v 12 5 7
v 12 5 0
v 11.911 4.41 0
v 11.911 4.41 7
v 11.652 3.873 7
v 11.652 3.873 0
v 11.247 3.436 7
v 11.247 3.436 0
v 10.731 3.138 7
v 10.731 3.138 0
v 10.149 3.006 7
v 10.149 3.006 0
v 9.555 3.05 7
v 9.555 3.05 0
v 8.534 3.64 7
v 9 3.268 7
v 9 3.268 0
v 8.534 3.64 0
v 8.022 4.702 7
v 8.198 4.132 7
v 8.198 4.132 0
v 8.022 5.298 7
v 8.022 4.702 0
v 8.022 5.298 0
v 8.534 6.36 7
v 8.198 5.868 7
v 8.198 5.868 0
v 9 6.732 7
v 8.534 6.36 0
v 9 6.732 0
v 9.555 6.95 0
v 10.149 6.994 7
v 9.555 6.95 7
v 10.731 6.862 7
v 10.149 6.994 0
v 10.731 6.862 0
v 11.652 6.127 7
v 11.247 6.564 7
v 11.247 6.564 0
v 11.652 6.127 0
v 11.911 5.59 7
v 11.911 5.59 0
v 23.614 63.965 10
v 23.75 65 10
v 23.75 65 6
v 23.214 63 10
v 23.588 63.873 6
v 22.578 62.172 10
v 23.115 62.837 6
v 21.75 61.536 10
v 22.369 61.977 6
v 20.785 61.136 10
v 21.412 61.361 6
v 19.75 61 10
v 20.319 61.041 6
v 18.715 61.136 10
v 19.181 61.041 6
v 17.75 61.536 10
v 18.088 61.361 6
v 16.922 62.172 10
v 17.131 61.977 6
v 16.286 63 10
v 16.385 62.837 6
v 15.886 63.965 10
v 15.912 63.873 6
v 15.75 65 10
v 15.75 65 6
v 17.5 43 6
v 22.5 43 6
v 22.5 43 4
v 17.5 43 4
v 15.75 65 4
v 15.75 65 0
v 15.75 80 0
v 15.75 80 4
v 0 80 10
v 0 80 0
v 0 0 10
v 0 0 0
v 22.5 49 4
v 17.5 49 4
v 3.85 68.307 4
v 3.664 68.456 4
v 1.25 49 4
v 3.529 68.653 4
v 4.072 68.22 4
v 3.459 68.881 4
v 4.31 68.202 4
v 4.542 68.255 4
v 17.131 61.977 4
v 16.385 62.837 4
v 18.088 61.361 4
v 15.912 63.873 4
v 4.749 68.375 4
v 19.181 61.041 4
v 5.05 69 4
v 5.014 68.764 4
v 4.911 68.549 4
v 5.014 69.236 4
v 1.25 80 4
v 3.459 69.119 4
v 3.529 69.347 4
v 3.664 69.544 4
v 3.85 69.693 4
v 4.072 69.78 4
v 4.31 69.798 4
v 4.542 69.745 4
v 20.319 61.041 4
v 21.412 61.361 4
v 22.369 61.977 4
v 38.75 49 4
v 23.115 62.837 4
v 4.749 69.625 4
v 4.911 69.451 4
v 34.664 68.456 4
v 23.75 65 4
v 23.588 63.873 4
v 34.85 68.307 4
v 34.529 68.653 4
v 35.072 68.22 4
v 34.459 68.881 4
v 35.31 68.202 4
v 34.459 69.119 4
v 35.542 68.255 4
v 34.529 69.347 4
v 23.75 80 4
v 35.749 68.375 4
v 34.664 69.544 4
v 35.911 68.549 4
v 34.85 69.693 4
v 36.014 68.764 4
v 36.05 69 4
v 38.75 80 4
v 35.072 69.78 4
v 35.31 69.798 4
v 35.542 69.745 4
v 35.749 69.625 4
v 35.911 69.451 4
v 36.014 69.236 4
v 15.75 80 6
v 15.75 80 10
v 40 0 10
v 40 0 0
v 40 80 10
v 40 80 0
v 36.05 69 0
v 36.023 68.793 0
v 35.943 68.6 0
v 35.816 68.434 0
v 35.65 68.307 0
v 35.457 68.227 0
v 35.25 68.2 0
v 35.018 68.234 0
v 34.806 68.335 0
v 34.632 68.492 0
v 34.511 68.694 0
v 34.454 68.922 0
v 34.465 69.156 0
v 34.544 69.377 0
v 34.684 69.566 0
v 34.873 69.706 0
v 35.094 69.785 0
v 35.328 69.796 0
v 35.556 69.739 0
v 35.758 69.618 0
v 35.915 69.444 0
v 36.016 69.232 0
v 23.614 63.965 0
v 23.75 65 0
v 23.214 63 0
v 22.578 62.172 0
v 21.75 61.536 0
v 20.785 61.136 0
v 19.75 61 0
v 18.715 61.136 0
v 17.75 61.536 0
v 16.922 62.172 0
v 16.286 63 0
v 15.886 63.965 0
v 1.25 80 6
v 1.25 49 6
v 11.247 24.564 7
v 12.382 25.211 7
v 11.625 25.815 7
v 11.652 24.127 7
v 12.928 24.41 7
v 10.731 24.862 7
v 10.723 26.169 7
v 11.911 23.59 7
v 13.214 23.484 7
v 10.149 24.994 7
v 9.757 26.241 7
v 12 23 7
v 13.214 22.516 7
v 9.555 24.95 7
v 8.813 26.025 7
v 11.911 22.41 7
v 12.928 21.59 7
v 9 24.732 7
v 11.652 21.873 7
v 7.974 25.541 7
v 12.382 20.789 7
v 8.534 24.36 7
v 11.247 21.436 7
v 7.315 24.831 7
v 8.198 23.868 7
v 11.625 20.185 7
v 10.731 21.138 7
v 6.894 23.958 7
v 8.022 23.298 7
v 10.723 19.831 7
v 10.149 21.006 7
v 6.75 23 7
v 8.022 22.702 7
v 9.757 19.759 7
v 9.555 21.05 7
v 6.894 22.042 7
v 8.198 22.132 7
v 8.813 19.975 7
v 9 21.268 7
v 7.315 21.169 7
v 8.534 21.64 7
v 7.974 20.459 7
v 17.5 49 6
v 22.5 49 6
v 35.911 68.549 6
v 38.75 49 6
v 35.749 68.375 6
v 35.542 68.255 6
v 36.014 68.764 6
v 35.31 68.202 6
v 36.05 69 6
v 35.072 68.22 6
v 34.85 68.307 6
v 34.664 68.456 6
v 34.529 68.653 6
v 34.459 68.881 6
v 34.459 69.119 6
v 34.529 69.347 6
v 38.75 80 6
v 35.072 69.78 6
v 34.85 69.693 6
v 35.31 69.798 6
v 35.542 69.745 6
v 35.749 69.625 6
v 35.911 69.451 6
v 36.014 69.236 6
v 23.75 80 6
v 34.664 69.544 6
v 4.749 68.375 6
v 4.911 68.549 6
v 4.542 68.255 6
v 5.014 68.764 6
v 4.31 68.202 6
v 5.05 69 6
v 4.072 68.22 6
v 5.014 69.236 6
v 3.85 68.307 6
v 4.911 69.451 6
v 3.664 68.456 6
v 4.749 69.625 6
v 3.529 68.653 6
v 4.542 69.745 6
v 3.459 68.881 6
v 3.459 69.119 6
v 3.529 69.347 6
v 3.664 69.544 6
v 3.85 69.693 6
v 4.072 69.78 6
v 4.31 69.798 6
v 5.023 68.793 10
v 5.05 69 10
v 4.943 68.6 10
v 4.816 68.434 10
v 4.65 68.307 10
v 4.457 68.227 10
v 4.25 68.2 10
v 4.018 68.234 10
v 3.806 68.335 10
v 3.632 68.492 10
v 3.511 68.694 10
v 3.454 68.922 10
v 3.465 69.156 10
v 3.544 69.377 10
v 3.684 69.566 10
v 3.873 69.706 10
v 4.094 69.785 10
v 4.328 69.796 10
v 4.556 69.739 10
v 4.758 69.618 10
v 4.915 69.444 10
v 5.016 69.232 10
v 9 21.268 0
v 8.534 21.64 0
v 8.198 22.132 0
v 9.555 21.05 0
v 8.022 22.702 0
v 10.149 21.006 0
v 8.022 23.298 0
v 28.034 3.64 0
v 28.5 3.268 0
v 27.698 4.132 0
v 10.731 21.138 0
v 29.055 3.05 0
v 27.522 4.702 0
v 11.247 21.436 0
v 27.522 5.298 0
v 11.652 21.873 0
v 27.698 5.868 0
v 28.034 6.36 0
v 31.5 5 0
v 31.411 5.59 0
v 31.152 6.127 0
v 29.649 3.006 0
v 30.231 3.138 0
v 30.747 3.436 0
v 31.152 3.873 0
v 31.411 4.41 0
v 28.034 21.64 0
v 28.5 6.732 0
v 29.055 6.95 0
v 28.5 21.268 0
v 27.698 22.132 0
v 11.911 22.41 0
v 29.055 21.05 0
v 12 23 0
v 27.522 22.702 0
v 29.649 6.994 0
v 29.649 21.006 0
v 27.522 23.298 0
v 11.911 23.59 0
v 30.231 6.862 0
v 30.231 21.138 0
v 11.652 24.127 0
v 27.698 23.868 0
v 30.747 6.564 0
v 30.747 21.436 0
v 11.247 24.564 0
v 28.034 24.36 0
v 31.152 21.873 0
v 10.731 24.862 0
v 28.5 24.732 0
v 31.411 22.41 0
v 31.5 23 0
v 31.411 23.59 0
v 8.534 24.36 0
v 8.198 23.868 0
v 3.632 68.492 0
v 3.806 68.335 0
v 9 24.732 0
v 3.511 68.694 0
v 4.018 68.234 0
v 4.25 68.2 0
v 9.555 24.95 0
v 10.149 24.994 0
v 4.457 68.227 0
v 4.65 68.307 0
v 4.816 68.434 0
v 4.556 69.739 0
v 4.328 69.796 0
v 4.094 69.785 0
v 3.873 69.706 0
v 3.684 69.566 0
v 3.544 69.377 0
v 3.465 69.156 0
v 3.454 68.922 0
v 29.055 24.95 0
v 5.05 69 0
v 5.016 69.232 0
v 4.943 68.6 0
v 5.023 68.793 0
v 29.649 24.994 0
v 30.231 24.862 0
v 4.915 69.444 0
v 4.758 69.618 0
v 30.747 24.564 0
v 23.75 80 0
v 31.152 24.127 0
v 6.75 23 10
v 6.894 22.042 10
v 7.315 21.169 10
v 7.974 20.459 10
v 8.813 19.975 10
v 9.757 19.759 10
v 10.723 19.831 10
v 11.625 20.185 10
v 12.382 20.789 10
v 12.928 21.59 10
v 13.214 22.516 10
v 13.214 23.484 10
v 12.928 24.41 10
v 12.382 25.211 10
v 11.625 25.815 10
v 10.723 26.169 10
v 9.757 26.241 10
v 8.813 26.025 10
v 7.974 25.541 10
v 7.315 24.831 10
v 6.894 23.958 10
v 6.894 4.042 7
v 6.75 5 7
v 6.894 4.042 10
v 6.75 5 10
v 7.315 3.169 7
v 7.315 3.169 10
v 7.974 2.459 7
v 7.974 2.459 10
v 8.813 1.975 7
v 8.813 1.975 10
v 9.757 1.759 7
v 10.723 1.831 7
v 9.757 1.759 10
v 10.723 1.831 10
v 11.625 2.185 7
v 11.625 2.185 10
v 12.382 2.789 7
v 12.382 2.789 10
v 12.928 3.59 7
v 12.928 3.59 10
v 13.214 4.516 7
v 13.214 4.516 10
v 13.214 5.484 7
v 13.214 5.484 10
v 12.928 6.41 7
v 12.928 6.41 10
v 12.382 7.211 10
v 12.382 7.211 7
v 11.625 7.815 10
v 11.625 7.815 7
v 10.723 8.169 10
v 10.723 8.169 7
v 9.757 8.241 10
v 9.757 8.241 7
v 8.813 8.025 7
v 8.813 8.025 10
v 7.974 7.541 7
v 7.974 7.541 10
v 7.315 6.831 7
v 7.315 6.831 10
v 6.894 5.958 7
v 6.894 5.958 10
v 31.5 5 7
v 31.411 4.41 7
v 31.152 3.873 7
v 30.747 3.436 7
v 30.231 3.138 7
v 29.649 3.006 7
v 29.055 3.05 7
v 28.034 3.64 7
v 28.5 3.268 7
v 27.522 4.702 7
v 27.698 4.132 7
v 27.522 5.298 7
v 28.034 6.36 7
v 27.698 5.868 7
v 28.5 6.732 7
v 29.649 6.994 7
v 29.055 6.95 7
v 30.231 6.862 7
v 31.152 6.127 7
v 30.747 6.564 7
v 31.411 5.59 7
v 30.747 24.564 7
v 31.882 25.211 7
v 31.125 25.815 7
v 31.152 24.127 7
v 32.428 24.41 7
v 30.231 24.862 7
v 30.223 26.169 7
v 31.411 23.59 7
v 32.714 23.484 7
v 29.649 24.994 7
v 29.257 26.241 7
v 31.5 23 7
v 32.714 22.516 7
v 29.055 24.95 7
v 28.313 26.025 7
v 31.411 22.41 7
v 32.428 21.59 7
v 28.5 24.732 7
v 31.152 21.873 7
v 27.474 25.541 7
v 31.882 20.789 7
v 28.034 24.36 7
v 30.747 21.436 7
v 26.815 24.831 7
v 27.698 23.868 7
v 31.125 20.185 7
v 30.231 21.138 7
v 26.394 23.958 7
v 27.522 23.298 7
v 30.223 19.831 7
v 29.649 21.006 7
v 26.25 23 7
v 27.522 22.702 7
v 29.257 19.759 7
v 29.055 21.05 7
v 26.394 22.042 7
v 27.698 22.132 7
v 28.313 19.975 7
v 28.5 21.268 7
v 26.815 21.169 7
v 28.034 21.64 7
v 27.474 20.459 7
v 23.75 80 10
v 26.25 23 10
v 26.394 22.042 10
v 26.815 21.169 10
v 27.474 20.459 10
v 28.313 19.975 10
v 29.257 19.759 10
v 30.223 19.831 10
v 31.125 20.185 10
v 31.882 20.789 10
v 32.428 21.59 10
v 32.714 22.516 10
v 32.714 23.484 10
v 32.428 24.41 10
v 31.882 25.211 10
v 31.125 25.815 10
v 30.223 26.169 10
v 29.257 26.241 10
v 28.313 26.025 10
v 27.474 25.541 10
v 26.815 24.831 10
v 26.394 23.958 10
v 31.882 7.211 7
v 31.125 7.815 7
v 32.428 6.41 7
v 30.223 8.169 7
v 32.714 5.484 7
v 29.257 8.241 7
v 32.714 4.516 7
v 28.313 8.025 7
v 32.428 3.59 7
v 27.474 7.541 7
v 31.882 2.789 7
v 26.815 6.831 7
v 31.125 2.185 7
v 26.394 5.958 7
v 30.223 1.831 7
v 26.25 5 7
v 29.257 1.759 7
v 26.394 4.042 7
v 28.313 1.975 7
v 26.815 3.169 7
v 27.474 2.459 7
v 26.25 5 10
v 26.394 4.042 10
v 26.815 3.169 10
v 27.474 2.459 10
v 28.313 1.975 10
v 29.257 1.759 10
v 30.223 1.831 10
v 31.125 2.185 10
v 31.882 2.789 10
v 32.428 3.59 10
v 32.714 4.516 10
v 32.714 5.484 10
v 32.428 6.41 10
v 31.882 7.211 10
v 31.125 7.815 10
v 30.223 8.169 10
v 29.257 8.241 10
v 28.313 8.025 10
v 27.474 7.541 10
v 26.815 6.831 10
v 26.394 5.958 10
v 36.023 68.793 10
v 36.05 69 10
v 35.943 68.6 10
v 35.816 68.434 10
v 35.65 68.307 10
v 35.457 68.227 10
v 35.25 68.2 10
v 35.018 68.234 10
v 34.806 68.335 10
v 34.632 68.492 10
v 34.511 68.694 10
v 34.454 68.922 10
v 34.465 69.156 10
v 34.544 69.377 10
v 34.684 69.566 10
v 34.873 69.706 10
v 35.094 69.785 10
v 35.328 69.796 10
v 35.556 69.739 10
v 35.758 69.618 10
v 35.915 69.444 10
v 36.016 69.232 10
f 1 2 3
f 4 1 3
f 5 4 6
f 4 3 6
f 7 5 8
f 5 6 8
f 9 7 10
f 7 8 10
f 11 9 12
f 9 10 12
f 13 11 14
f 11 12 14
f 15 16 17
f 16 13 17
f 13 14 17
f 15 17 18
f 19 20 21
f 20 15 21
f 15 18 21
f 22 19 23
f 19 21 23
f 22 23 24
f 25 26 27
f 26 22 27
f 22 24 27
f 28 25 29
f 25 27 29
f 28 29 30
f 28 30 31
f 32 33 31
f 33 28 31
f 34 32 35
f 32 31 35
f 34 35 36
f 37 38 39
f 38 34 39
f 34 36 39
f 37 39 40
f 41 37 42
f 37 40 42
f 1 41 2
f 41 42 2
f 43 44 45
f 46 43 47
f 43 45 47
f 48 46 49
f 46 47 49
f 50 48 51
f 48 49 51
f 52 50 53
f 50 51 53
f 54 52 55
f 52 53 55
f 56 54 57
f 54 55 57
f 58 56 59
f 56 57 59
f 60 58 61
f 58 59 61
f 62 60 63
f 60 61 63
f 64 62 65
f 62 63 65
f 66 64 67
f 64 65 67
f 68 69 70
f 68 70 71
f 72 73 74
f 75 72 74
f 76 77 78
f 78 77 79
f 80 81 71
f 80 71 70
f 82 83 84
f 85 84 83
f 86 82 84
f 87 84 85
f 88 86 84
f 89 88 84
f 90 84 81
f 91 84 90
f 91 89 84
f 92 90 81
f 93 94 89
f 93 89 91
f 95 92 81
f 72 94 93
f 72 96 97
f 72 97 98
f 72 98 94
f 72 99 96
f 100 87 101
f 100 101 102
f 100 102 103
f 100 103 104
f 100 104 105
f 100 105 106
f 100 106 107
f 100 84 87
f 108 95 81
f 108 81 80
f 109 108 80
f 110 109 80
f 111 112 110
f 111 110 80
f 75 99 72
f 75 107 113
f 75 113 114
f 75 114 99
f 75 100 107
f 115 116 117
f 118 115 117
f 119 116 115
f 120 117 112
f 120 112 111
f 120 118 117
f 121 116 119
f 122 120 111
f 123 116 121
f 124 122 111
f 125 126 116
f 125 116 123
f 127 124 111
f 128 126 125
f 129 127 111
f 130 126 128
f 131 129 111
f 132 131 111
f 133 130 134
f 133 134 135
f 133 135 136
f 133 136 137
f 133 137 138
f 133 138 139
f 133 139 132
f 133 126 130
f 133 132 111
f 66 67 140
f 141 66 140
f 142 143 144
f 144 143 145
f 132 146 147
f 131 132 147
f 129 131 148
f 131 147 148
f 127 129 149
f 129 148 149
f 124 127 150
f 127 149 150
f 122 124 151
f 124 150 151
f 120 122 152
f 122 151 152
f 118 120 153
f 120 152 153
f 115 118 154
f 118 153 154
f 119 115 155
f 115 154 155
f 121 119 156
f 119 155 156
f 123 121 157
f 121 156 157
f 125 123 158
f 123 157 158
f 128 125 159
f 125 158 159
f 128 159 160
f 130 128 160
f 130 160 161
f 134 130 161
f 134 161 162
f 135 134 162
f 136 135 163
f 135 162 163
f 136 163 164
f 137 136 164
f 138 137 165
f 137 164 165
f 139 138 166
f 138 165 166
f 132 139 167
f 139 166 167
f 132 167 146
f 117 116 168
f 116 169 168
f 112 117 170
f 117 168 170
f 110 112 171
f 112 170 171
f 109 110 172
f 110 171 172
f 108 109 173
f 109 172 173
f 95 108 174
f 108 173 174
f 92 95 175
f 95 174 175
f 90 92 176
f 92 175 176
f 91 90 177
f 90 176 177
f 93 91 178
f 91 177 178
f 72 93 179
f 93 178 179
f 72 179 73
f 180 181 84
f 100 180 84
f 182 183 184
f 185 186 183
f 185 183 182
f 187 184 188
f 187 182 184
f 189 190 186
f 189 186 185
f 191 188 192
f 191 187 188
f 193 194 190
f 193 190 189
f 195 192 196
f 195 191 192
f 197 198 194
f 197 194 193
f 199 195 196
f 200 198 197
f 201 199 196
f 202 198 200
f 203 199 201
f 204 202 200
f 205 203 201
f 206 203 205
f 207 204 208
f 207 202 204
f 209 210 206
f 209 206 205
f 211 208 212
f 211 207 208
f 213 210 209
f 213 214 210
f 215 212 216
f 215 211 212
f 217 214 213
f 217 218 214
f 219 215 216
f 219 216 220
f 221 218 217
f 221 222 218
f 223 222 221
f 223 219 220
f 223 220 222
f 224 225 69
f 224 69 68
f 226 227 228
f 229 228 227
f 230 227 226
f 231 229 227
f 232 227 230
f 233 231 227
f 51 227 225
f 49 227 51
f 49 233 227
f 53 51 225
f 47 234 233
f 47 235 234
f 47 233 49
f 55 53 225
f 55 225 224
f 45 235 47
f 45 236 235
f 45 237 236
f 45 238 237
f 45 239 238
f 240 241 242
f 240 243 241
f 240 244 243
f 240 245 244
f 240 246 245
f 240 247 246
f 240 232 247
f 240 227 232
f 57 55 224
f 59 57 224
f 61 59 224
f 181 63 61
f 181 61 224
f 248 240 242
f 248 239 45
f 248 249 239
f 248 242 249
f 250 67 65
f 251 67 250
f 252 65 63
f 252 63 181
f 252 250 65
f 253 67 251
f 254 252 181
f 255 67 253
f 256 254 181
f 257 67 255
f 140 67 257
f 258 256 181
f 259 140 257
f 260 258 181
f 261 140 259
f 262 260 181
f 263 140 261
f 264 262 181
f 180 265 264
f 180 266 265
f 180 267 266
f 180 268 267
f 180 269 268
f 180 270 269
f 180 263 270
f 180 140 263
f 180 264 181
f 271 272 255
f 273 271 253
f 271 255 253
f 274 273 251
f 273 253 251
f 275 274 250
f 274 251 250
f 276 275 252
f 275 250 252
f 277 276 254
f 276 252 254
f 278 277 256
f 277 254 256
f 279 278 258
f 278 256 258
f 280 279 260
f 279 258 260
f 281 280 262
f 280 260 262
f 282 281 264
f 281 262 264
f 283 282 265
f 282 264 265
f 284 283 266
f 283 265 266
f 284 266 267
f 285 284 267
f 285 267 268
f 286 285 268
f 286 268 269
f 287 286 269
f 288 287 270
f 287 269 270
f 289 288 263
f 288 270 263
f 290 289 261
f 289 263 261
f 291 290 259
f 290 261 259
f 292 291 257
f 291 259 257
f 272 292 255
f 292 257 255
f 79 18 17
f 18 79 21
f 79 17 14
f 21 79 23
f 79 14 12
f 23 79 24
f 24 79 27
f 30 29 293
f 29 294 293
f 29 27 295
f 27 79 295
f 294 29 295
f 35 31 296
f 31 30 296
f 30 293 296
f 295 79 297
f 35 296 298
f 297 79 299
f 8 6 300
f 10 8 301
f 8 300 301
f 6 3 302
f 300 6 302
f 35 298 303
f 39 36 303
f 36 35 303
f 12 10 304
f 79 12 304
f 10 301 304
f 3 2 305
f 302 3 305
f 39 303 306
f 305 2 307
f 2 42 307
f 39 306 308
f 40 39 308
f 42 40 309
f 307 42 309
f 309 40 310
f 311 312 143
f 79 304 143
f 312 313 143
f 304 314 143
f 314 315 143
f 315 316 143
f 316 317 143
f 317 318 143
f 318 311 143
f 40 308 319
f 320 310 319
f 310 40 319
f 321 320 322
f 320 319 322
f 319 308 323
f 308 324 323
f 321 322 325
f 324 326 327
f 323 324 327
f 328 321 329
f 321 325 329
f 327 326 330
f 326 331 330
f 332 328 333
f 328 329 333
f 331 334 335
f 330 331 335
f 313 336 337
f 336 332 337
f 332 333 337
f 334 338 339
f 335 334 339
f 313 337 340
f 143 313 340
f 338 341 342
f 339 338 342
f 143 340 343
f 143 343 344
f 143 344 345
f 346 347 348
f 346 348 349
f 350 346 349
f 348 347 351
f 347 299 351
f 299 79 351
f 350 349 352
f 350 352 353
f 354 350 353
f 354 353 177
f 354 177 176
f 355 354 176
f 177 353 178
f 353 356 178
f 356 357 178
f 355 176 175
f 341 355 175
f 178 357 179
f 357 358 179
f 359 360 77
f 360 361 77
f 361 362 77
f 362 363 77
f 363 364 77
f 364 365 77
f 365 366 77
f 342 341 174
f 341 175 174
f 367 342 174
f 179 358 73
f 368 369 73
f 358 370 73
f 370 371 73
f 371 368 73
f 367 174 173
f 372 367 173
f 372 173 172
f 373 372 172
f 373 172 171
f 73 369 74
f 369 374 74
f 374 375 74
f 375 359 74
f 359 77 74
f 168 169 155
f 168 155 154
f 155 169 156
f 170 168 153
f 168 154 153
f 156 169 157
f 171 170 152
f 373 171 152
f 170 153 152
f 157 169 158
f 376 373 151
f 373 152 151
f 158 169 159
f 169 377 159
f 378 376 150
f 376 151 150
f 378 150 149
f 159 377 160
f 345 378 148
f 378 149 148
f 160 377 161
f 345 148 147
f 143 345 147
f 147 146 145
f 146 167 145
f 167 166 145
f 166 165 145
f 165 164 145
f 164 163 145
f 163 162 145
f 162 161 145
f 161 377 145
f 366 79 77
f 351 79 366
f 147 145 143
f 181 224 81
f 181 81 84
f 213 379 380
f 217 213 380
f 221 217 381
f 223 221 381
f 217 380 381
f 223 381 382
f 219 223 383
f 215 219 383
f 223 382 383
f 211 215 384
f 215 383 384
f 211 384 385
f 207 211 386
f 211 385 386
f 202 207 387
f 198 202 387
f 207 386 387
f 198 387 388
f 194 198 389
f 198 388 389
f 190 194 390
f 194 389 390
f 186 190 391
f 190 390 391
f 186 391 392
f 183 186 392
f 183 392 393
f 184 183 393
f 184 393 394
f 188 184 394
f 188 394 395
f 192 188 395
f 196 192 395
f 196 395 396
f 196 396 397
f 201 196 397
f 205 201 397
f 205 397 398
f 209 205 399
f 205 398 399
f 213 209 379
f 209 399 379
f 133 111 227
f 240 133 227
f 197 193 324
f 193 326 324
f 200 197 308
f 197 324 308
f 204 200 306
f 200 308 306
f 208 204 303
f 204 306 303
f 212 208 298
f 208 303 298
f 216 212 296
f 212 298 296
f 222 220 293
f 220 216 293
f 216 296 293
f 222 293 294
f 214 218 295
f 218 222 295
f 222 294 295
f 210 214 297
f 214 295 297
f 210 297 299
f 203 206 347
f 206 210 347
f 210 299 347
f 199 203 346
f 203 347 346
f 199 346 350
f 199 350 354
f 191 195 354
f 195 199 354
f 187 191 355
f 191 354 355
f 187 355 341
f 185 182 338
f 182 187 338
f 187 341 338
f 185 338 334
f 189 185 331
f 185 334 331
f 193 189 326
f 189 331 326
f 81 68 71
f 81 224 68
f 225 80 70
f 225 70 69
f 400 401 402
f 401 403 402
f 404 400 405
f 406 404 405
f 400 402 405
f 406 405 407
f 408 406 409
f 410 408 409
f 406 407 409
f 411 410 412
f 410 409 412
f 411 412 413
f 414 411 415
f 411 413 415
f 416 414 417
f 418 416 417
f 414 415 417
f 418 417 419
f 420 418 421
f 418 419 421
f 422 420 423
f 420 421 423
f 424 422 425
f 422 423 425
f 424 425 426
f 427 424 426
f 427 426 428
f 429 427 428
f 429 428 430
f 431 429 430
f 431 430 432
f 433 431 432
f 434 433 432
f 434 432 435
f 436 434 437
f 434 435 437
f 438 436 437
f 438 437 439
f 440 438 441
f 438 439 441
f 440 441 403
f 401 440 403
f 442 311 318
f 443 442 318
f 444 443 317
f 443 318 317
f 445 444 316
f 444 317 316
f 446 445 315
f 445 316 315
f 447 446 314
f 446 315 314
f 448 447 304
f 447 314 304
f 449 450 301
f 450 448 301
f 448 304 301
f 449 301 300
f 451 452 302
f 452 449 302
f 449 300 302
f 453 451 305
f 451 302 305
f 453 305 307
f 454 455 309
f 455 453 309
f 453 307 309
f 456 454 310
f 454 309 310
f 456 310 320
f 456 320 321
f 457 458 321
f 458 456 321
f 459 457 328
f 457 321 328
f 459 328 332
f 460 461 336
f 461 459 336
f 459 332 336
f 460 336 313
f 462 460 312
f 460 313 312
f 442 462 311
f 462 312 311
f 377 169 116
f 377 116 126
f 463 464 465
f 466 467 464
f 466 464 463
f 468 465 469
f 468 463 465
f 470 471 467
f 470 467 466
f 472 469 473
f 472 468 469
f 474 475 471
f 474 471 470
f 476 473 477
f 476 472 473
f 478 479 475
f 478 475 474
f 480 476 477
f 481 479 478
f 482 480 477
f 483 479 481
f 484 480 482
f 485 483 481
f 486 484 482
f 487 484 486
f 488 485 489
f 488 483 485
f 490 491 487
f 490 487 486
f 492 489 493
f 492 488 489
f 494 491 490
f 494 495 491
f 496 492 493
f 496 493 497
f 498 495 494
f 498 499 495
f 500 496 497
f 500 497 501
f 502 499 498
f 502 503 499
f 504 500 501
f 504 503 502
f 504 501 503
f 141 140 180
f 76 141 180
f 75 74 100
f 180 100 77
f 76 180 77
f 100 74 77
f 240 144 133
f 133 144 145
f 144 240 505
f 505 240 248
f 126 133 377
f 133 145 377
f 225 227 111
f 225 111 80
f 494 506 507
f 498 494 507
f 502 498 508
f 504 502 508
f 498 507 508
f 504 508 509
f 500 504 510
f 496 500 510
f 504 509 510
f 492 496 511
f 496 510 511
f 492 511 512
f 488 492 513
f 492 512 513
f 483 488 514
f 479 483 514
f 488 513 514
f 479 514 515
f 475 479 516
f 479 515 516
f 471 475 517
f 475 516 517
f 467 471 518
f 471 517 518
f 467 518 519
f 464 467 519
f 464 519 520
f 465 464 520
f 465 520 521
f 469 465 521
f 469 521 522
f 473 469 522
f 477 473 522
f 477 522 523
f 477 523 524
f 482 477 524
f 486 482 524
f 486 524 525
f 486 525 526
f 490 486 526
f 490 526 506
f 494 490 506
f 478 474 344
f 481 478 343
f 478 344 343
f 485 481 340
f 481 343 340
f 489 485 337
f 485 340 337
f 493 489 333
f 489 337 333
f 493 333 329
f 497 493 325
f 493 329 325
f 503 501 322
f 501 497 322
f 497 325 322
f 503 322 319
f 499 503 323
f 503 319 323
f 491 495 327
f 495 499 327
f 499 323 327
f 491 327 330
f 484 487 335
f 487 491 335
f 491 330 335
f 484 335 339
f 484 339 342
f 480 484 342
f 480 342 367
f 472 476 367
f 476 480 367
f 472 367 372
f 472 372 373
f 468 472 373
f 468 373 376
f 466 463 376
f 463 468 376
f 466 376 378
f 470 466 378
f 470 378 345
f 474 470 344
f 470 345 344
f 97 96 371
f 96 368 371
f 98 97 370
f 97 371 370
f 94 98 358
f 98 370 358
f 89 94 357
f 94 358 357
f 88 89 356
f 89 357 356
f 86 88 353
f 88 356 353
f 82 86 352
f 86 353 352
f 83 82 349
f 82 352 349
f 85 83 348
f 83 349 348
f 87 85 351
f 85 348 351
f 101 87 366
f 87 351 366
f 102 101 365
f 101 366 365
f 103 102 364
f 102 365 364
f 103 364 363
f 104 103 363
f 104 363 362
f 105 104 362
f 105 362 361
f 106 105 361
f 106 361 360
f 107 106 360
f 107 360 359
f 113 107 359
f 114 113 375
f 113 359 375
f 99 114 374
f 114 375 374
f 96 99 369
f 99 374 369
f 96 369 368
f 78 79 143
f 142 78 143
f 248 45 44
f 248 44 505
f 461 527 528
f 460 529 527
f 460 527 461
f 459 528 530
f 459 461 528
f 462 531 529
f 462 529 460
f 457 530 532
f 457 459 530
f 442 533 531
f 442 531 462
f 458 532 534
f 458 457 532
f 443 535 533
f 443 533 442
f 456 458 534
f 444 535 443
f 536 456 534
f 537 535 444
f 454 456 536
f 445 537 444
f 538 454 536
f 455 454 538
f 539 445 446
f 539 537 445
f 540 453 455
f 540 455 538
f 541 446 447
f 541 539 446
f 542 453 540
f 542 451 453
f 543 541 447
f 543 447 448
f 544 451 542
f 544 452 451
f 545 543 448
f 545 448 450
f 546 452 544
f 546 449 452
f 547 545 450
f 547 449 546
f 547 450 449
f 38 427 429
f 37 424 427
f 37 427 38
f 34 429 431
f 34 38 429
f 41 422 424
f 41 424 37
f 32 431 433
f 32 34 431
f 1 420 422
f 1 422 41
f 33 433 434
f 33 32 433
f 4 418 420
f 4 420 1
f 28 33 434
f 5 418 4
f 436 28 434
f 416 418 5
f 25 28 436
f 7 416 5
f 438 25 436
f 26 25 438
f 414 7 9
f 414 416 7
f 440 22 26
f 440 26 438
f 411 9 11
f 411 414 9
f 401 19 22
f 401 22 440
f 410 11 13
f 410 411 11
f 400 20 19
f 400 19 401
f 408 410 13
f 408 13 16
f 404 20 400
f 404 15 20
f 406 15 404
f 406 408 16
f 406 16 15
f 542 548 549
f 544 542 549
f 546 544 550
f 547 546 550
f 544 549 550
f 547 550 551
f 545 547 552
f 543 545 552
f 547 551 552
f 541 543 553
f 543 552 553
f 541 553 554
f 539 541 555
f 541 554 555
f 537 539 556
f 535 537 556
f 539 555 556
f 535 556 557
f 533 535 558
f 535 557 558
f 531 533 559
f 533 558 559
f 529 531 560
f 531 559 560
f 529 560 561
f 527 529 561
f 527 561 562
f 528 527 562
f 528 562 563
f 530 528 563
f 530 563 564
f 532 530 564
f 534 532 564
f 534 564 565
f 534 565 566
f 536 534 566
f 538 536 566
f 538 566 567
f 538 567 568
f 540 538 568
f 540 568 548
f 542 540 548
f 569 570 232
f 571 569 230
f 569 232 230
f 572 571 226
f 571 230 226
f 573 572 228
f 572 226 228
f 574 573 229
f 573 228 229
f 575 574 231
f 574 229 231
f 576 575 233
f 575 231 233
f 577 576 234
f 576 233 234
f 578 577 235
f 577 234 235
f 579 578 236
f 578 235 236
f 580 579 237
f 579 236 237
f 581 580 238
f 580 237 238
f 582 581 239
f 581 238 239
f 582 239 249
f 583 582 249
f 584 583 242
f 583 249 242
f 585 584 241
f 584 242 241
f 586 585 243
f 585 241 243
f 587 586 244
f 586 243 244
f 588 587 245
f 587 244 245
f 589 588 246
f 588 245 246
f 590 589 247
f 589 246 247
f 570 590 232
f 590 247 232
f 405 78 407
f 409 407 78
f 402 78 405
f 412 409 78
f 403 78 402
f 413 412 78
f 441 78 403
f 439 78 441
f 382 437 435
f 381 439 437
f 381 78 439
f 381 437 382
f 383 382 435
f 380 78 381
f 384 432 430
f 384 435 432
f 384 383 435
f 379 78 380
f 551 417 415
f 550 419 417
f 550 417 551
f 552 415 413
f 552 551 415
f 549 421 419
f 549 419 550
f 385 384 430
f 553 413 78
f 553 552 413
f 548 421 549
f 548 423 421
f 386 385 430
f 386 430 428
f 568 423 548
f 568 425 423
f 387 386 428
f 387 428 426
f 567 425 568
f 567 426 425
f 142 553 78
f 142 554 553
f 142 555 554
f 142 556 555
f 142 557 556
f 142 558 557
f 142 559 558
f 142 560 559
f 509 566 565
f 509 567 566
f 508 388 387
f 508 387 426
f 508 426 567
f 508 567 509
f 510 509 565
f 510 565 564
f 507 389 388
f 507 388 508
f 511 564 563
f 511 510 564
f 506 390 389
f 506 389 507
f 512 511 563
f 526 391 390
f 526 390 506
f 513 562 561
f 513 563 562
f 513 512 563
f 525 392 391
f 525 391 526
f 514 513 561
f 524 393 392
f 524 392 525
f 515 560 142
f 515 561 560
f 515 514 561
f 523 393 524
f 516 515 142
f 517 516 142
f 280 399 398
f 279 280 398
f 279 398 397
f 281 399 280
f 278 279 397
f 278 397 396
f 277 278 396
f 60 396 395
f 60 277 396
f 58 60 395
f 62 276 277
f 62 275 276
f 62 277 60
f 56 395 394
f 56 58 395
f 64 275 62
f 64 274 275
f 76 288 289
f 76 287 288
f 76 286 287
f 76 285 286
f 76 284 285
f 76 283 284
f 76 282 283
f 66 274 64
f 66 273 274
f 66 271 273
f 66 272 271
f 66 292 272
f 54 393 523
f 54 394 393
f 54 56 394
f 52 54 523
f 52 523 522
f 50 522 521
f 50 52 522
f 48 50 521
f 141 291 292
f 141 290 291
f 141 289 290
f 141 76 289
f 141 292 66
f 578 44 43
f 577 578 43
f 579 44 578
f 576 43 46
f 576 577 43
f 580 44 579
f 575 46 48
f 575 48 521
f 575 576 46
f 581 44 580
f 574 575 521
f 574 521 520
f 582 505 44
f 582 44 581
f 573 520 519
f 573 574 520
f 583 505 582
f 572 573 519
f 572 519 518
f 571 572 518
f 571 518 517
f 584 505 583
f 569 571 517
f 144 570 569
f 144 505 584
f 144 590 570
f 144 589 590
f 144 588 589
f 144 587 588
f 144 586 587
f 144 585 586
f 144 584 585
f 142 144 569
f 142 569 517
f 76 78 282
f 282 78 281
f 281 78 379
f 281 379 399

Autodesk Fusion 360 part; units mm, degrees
sketch "Sketch1" plane through (0, 0, 0) normal (0, 0, 1) x (1, 0, 0)
  line L0 (0, 0) -> (40, 0)
  line L1 (40, 0) -> (40, 80)
  line L2 (40, 80) -> (0, 80)
  line L3 (0, 80) -> (0, 0)
  line L4 (10, 5) -> (29.5, 5)
  line L5 (29.5, 5) -> (29.5, 23)
  line L6 (29.5, 23) -> (10, 23)
  line L7 (10, 23) -> (10, 5)
  line L8 (19.75, 23) -> (19.75, 65)
  circle A0 centre (19.75, 65) radius 4
  circle A1 centre (10, 23) radius 2
  circle A2 centre (10, 5) radius 2
  circle A3 centre (29.5, 23) radius 2
  circle A4 centre (29.5, 5) radius 2
  line L9 (15.75, 65) -> (15.75, 80)
  line L10 (23.75, 65) -> (23.75, 80)
  line L11 (19.75, 61) -> (35.25, 61)
  line L12 (19.75, 61) -> (4.25, 61)
  line L13 (35.25, 61) -> (35.25, 69)
  circle A5 centre (35.25, 69) radius 0.8
  line L14 (4.25, 61) -> (4.25, 69)
  circle A6 centre (4.25, 69) radius 0.8
  dimension "d1" = 40
  dimension "d2" = 80
  dimension "d3" = 19.5
  dimension "d4" = 18
  dimension "d6" = 42
  dimension "d7" = 8
  dimension "d8" = 4
  dimension "d9" = 4
  dimension "d10" = 4
  dimension "d11" = 4
  dimension "d22" = 15.5
  dimension "d23" = 15.5
  dimension "d24" = 8
  dimension "d25" = 1.6
  dimension "d26" = 8
  dimension "d27" = 1.6
extrude "Extrude1" add sketch "Sketch1" along normal blind 10 contours L4 L5 L6 L7 A1 A2 A3 A4 | L0 L1 L2 L3 A0 L9 L10
sketch "Sketch3" plane through (0, 80, 0) normal (0, 1, 0) x (-1, 0, 0)
  line L0 (-40, 0) -> (-23.75, 0)
  line L1 (-23.75, 0) -> (-23.75, 10)
  line L2 (-23.75, 10) -> (-40, 10)
  line L3 (-40, 10) -> (-40, 0)
  line L4 (-40, 0) -> (-40, 4)
  line L5 (-40, 4) -> (-40, 6)
  line L6 (-40, 6) -> (-40, 10)
  line L7 (-20, 4) -> (-20, 6)
  line L8 (-20, 5) -> (-1.25, 5)
  line L9 (-20, 5) -> (-38.75, 5)
  line L10 (-38.75, 5) -> (-38.75, 6)
  line L11 (-1.25, 5) -> (-1.25, 4)
  line L12 (-38.75, 6) -> (-1.25, 6)
  line L13 (-1.25, 6) -> (-1.25, 4)
  line L14 (-1.25, 4) -> (-38.75, 4)
  line L15 (-38.75, 4) -> (-38.75, 6)
  dimension "d14" = 4
  dimension "d15" = 2
  dimension "d16" = 18.75
  dimension "d17" = 18.75
  dimension "d18" = 1
  dimension "d19" = 1
extrude "Extrude2" cut sketch "Sketch3" against normal blind 31 contours L1 L9 L14 L15 | L1 L7 L9 L14 | L1 L9 L10 L12 L15 | L1 L7 L9 L12 | L7 L8 L11 L13 L14 | L7 L8 L12 L13
sketch "Sketch4" plane through (0, 49, 0) normal (0, 1, 0) x (-1, 0, 0)
  line L0 (-1.25, 6) -> (-38.75, 6)
  line L1 (-38.75, 6) -> (-38.75, 4)
  line L2 (-38.75, 4) -> (-1.25, 4)
  line L3 (-1.25, 4) -> (-1.25, 6)
  line L4 (-22.5, 6) -> (-17.5, 6)
  line L5 (-17.5, 6) -> (-17.5, 4)
  line L6 (-17.5, 4) -> (-22.5, 4)
  line L7 (-22.5, 4) -> (-22.5, 6)
  dimension "d30" = 5
  dimension "d31" = 2
extrude "Extrude3" cut sketch "Sketch4" against normal blind 6 contours L0 L2 L4 L5 L6 L7
sketch "Sketch5" plane through (0, 0, 10) normal (0, 0, 1) x (-1, 0, 0)
  circle A0 centre (-10, -23) radius 2
  circle A1 centre (-29.5, -5) radius 2
  circle A2 centre (-35.25, -69) radius 0.8
  circle A3 centre (-4.25, -69) radius 0.8
  circle A4 centre (-29.5, -23) radius 2
  circle A5 centre (-10, -5) radius 2
  line L0 (-15.75, -65) -> (-15.75, -80)
  line L1 (-15.75, -80) -> (0, -80)
  line L2 (0, -80) -> (0, 0)
  line L3 (0, 0) -> (-40, 0)
  line L4 (-40, 0) -> (-40, -80)
  line L5 (-40, -80) -> (-23.75, -80)
  line L6 (-23.75, -80) -> (-23.75, -65)
  arc A6 (-15.75, -65) -> (-23.75, -65) centre (-19.75, -65) ccw
  circle A7 centre (-10, -5) radius 3.25
  circle A8 centre (-10, -23) radius 3.25
  circle A9 centre (-29.5, -5) radius 3.25
  circle A10 centre (-29.5, -23) radius 3.25
  dimension "d34" = 6.5
  dimension "d35" = 6.5
  dimension "d36" = 6.5
  dimension "d37" = 6.5
extrude "Extrude4" cut sketch "Sketch5" against normal blind 3 contours A7 | A8 | A9 | A10
